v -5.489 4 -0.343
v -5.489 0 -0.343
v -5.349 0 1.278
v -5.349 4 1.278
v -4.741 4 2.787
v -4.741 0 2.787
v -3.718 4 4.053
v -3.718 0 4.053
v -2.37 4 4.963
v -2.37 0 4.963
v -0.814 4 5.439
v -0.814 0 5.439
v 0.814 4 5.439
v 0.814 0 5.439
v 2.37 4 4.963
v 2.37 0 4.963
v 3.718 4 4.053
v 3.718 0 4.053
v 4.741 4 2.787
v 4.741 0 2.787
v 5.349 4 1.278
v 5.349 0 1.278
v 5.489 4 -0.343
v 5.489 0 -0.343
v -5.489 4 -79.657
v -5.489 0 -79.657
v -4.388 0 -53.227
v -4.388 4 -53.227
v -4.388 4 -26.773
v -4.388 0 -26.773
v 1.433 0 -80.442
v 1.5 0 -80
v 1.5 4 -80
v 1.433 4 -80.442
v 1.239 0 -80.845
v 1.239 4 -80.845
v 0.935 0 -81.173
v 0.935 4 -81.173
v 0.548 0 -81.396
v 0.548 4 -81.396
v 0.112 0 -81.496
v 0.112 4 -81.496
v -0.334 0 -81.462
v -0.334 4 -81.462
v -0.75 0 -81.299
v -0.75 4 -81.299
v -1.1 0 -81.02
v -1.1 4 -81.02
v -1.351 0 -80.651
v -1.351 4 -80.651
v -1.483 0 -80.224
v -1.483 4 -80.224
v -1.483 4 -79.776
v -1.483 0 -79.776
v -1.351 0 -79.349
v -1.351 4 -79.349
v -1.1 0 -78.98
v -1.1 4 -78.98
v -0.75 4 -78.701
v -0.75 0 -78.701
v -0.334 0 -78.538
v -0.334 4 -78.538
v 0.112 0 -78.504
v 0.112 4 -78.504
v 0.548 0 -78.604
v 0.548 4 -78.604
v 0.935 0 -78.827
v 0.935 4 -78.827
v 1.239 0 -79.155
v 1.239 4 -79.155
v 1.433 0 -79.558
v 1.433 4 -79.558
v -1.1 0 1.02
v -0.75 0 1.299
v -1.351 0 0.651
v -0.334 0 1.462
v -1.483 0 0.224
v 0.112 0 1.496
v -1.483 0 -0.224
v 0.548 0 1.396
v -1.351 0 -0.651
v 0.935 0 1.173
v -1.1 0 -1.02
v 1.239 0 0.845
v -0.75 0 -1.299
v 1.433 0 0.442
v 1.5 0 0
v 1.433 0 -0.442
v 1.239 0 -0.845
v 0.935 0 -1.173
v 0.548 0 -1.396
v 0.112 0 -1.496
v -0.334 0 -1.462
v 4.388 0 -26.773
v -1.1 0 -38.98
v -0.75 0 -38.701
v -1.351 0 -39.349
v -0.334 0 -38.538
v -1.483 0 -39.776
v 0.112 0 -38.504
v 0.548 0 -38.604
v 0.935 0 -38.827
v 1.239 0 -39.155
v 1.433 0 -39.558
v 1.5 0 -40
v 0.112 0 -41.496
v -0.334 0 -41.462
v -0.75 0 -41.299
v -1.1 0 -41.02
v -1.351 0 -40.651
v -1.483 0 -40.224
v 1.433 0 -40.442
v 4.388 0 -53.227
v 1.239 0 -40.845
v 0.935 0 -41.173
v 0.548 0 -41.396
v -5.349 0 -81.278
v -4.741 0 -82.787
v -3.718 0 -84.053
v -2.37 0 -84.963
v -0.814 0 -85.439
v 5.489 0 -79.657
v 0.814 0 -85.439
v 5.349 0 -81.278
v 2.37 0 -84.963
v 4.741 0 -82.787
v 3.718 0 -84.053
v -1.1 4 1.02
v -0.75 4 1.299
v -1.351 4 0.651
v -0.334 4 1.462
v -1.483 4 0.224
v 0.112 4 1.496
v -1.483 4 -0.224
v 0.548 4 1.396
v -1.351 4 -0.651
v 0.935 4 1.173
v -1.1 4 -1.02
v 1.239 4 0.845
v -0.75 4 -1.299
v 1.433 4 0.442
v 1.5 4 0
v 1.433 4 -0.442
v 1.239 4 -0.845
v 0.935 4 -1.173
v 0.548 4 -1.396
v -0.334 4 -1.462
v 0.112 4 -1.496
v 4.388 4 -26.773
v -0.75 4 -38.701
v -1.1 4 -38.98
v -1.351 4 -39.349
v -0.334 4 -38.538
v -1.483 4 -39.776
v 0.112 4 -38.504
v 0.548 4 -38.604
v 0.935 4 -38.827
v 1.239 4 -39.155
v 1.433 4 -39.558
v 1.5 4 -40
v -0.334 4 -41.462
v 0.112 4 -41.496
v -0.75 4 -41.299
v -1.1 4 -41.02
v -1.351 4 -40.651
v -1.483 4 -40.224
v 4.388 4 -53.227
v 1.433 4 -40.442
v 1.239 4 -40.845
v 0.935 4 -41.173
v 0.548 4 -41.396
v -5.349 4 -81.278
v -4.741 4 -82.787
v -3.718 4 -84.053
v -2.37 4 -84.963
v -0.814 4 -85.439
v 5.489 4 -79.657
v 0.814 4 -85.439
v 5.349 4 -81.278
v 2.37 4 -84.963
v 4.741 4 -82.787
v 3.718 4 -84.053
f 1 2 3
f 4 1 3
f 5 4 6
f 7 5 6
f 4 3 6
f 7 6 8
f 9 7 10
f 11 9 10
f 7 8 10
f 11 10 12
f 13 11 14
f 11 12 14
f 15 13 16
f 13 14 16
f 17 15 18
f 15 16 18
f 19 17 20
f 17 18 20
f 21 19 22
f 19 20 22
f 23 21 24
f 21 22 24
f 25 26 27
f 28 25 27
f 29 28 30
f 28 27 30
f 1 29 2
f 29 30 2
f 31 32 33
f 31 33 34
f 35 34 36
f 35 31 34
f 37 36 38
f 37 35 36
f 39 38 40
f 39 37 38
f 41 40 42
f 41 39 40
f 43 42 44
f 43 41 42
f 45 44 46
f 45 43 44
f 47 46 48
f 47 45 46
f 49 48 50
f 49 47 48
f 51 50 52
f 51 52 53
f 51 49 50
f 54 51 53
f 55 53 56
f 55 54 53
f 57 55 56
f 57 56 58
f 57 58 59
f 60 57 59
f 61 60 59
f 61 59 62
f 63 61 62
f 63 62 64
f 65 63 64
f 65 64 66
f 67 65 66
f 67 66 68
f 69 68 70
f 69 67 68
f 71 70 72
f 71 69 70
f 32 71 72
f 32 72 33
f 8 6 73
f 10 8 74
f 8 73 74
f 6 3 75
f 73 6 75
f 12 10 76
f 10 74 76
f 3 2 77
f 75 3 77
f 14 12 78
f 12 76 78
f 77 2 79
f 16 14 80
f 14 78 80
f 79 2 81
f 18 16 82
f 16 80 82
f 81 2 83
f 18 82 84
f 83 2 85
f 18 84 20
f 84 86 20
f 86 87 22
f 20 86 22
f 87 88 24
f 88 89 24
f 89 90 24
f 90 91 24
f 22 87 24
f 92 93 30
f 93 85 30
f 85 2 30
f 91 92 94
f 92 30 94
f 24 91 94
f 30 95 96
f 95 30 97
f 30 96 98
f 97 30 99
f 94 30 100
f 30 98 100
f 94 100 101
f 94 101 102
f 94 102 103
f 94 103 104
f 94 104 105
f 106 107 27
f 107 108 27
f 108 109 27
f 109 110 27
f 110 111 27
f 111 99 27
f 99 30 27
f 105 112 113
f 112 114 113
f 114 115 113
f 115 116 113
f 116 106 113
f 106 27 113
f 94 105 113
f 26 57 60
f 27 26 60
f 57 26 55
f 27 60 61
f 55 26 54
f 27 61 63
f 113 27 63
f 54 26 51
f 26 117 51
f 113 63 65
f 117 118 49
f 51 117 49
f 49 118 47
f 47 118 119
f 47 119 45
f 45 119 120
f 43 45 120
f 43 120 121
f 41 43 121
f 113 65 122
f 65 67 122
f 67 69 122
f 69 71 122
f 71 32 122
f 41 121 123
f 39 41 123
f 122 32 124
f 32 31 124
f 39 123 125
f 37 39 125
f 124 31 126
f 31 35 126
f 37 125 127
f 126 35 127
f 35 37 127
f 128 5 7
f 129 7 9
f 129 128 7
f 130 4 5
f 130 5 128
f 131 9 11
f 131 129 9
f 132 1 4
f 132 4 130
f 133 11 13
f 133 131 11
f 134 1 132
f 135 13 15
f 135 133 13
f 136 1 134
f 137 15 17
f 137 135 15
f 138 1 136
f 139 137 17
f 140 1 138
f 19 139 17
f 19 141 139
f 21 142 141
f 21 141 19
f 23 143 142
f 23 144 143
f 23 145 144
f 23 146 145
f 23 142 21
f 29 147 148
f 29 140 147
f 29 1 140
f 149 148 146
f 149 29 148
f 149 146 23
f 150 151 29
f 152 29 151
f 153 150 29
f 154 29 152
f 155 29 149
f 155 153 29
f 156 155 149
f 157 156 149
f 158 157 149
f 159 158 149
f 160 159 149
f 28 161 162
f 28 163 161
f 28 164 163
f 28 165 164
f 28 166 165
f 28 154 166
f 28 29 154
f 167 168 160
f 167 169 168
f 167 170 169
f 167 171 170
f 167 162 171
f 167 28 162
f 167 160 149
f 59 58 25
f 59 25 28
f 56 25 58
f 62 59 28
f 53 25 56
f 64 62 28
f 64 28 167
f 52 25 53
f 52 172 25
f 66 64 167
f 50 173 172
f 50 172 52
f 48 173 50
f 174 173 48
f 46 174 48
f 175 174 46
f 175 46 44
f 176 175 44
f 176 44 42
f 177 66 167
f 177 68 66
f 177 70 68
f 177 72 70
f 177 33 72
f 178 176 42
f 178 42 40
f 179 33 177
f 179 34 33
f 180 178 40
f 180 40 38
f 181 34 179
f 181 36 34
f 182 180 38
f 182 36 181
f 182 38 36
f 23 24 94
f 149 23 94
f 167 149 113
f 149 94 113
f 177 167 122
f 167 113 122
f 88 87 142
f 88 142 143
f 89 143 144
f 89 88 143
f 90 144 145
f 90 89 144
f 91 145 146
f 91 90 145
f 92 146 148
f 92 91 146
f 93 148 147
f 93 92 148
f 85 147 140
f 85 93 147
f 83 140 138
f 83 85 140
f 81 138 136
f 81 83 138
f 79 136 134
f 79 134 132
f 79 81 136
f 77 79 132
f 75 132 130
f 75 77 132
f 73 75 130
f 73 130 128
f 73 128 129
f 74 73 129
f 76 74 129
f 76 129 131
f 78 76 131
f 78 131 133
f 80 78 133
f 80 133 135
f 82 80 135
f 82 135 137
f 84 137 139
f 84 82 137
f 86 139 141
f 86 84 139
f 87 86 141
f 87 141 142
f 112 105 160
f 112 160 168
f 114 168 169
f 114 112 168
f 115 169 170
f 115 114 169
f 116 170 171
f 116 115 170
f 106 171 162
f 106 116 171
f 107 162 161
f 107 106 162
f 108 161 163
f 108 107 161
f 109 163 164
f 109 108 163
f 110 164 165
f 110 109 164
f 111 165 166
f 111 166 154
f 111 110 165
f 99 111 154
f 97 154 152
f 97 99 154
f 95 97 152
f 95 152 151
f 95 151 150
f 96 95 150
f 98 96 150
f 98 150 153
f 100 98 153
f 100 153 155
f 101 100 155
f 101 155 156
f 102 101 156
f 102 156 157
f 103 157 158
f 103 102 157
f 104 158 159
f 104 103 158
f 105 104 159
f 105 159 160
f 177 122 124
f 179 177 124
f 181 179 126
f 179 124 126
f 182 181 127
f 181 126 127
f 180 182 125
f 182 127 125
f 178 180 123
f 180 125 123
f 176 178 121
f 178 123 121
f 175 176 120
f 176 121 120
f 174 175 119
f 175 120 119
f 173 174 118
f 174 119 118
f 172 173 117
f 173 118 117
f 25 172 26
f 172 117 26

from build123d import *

# Parameters (mm, degrees)
SKETCH1_R           = 1.5
BOSS_EXTRUDE1_DEPTH = 4


with BuildPart() as part:
    # Sketch1 → Boss-Extrude1 (new body)
    with BuildSketch(Plane(origin=(0, 0, 0), x_dir=(1, 0, 0), z_dir=(0, 1, 0))):
        with BuildLine():
            ThreePointArc((-5.489268293, 0.343414634), (0, -5.5), (5.489268293, 0.343414634))
            ThreePointArc((5.489268293, 0.343414634), (4.25, 40), (5.489268293, 79.656585366))
            ThreePointArc((5.489268293, 79.656585366), (0, 85.5), (-5.489268293, 79.656585366))
            ThreePointArc((-5.489268293, 79.656585366), (-4.25, 40), (-5.489268293, 0.343414634))
        make_face()
        Circle(SKETCH1_R, mode=Mode.SUBTRACT)
        with Locations((0, 80)):
            Circle(SKETCH1_R, mode=Mode.SUBTRACT)
        with Locations((0, 40)):
            Circle(SKETCH1_R, mode=Mode.SUBTRACT)
    extrude(amount=BOSS_EXTRUDE1_DEPTH)


solid = part.part
